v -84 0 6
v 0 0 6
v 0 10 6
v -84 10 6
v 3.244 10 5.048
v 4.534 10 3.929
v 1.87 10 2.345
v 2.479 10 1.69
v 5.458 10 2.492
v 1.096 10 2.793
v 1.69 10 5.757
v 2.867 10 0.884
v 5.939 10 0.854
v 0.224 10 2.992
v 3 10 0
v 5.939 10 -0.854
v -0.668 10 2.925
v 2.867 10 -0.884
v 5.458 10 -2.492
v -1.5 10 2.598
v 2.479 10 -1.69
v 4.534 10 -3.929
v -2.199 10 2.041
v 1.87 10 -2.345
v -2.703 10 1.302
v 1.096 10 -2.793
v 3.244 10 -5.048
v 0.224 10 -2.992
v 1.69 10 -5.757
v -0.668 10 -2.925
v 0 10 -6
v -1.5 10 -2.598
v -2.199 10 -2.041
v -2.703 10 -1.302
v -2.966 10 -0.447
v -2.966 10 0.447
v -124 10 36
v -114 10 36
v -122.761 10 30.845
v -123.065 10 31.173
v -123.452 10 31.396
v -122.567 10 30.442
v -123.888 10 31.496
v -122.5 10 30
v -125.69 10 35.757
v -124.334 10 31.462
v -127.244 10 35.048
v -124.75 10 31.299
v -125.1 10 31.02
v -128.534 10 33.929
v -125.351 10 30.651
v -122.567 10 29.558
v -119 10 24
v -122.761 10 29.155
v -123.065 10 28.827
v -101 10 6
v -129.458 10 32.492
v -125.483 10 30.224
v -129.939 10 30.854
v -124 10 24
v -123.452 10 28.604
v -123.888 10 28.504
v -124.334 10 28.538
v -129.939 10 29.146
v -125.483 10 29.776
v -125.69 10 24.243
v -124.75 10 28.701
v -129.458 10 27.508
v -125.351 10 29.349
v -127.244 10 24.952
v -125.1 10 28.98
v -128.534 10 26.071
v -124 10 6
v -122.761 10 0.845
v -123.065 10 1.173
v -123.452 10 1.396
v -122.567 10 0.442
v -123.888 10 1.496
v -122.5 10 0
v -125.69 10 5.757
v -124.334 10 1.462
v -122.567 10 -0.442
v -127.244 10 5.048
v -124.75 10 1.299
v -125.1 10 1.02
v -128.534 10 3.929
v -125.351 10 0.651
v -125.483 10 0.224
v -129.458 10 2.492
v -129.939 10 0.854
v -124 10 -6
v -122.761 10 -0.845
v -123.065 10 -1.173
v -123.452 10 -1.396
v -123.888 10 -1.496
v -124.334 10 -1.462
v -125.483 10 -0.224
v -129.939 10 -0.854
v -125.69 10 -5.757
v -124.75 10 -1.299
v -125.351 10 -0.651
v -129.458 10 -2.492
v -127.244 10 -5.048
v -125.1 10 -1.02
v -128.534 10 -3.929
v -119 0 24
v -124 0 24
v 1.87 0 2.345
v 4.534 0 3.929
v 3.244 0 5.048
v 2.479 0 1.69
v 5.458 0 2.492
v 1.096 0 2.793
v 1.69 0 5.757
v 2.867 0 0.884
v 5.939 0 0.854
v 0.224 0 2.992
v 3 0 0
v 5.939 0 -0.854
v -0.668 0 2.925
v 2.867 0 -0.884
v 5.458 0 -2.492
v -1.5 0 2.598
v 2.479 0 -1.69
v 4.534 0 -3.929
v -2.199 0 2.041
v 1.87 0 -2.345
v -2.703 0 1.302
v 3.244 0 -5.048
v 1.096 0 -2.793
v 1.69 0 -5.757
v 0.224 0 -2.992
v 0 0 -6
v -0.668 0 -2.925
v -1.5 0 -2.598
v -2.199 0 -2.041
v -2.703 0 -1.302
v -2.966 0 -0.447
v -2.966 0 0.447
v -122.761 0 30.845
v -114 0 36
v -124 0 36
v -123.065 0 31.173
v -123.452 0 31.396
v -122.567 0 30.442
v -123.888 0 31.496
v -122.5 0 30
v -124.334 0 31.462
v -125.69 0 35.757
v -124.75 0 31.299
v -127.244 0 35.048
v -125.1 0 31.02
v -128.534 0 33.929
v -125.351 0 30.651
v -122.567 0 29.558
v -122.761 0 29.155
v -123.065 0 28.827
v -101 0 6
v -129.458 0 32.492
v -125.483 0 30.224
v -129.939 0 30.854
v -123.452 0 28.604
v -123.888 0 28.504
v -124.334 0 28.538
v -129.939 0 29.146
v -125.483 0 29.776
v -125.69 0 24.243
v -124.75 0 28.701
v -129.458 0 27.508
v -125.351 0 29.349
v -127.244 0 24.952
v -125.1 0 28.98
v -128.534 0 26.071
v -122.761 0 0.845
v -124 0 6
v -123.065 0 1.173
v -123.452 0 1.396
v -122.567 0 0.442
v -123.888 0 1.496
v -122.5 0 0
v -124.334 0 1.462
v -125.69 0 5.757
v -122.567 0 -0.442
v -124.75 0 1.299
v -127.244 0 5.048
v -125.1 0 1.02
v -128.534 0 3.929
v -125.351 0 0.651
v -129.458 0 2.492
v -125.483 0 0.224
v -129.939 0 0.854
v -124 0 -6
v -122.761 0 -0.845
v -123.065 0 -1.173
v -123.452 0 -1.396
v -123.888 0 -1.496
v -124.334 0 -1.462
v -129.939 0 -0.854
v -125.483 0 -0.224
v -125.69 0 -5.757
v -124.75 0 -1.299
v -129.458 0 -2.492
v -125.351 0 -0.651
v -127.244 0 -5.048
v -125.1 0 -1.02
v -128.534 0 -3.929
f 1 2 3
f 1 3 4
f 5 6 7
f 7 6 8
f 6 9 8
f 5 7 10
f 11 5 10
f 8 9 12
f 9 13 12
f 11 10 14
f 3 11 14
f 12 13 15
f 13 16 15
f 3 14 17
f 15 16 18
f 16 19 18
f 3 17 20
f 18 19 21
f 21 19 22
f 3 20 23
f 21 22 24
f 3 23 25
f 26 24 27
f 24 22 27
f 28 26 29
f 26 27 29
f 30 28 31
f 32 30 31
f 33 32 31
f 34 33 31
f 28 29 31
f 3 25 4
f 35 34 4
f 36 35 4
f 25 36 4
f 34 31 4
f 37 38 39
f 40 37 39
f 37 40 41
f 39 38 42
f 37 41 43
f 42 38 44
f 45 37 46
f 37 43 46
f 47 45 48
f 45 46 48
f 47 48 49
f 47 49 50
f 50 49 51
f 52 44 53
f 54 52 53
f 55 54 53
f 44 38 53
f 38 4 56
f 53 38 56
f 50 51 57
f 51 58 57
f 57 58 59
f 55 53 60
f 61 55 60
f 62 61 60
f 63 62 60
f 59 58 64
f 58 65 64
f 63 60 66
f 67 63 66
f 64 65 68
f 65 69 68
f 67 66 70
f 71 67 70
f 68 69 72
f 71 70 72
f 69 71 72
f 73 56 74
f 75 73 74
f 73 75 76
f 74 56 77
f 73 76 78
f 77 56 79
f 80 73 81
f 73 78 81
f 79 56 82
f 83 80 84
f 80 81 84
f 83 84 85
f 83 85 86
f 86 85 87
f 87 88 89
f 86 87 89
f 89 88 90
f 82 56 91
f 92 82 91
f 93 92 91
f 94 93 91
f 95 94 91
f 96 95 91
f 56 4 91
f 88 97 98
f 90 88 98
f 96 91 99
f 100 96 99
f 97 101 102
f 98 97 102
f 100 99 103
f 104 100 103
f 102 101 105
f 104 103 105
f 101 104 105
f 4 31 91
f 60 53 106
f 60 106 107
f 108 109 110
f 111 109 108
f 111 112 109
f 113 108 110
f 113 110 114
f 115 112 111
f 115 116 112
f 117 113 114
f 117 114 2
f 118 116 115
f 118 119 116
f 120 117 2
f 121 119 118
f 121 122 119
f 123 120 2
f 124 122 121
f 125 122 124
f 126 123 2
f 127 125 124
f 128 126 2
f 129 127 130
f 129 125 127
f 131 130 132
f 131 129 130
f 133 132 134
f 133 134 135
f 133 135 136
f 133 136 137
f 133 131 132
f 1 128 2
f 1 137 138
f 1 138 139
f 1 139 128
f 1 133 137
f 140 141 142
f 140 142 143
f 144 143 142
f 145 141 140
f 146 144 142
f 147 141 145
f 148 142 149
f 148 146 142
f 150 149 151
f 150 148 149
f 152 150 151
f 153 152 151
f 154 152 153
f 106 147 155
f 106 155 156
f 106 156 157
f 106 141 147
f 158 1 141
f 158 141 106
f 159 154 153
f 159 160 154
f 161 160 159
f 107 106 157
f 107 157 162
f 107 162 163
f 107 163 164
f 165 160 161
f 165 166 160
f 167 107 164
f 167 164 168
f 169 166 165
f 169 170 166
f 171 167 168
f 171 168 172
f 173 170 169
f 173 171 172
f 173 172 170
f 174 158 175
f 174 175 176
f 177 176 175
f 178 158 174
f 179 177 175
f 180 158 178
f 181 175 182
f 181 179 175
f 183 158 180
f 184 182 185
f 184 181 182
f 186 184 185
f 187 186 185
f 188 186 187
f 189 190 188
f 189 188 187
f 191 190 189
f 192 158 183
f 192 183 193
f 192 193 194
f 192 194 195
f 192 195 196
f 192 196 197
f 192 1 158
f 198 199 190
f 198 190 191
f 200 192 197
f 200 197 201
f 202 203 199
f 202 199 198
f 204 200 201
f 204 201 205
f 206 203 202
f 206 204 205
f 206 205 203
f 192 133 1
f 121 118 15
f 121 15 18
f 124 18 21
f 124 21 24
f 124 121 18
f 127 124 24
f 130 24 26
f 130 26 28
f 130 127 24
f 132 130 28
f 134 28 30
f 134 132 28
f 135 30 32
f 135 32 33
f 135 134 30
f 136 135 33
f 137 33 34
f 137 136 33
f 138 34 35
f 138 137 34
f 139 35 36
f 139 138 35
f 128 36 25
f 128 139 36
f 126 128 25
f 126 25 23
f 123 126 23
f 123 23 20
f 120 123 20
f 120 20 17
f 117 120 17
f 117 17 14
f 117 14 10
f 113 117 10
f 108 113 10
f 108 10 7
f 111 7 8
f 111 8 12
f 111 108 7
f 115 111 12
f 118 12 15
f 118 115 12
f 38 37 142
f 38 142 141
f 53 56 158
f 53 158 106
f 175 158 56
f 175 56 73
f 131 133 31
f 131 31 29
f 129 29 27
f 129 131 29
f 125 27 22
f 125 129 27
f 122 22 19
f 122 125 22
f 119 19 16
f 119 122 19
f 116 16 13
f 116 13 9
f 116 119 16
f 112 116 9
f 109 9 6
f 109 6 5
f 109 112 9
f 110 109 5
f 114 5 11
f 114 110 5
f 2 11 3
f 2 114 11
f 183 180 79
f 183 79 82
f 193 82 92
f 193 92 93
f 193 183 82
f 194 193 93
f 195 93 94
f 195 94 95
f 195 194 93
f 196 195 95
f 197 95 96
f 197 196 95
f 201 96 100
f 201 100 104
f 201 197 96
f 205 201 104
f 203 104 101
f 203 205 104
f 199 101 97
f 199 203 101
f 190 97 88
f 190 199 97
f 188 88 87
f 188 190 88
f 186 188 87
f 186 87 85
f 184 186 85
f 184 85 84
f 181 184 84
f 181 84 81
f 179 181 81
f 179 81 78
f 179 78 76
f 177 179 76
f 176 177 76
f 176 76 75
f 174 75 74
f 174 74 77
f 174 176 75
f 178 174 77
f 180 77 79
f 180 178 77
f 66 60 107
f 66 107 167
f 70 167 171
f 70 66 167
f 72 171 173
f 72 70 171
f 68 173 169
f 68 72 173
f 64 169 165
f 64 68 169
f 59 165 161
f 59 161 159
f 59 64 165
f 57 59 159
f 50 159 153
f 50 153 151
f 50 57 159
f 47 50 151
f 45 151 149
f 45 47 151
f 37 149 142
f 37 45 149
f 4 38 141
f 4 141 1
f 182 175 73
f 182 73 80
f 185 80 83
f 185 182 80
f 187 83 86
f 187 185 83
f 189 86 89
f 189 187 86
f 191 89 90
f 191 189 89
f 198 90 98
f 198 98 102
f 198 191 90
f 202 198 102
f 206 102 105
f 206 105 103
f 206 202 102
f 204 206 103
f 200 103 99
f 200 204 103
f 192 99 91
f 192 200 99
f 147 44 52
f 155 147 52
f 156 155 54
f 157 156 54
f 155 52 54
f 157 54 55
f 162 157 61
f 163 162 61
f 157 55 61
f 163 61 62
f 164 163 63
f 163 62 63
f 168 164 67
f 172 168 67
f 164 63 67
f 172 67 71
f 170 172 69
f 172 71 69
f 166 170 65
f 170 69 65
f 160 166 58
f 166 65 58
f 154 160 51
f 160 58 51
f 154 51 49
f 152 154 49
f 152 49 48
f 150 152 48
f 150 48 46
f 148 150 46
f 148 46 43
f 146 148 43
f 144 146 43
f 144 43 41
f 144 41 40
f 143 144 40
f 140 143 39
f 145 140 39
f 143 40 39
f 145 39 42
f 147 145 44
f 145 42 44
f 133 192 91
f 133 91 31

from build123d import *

# Parameters (mm, degrees)
SKETCH1_R           = 3
SKETCH1_R_2         = 1.5
BOSS_EXTRUDE1_DEPTH = 10
SKETCH2_R           = 1.5
BOSS_EXTRUDE2_DEPTH = 10


with BuildPart() as part:
    # Sketch1 → Boss-Extrude1 (new body)
    with BuildSketch(Plane(origin=(0, 0, 0), x_dir=(1, 0, 0), z_dir=(0, 1, 0))):
        with BuildLine():
            Line((0, -6), (-124, -6))
            ThreePointArc((-124, -6), (-130, 0), (-124, 6))
            Line((-124, 6), (0, 6))
            ThreePointArc((0, 6), (6, 0), (0, -6))
        make_face()
        Circle(SKETCH1_R, mode=Mode.SUBTRACT)
        with Locations((-124, 0)):
            Circle(SKETCH1_R_2, mode=Mode.SUBTRACT)
    extrude(amount=BOSS_EXTRUDE1_DEPTH)

    # Sketch2 → Boss-Extrude2 (add)
    with BuildSketch(Plane(origin=(0, 10, 0), x_dir=(1, 0, 0), z_dir=(0, 1, 0))):
        with BuildLine():
            Line((-119, -24), (-124, -24))
            ThreePointArc((-124, -24), (-130, -30), (-124, -36))
            Line((-124, -36), (-114, -36))
            Line((-114, -36), (-84, -6))
            Line((-84, -6), (-101, -6))
            Line((-101, -6), (-119, -24))
        make_face()
        with Locations((-124, -30)):
            Circle(SKETCH2_R, mode=Mode.SUBTRACT)
    extrude(amount=-BOSS_EXTRUDE2_DEPTH)


solid = part.part
